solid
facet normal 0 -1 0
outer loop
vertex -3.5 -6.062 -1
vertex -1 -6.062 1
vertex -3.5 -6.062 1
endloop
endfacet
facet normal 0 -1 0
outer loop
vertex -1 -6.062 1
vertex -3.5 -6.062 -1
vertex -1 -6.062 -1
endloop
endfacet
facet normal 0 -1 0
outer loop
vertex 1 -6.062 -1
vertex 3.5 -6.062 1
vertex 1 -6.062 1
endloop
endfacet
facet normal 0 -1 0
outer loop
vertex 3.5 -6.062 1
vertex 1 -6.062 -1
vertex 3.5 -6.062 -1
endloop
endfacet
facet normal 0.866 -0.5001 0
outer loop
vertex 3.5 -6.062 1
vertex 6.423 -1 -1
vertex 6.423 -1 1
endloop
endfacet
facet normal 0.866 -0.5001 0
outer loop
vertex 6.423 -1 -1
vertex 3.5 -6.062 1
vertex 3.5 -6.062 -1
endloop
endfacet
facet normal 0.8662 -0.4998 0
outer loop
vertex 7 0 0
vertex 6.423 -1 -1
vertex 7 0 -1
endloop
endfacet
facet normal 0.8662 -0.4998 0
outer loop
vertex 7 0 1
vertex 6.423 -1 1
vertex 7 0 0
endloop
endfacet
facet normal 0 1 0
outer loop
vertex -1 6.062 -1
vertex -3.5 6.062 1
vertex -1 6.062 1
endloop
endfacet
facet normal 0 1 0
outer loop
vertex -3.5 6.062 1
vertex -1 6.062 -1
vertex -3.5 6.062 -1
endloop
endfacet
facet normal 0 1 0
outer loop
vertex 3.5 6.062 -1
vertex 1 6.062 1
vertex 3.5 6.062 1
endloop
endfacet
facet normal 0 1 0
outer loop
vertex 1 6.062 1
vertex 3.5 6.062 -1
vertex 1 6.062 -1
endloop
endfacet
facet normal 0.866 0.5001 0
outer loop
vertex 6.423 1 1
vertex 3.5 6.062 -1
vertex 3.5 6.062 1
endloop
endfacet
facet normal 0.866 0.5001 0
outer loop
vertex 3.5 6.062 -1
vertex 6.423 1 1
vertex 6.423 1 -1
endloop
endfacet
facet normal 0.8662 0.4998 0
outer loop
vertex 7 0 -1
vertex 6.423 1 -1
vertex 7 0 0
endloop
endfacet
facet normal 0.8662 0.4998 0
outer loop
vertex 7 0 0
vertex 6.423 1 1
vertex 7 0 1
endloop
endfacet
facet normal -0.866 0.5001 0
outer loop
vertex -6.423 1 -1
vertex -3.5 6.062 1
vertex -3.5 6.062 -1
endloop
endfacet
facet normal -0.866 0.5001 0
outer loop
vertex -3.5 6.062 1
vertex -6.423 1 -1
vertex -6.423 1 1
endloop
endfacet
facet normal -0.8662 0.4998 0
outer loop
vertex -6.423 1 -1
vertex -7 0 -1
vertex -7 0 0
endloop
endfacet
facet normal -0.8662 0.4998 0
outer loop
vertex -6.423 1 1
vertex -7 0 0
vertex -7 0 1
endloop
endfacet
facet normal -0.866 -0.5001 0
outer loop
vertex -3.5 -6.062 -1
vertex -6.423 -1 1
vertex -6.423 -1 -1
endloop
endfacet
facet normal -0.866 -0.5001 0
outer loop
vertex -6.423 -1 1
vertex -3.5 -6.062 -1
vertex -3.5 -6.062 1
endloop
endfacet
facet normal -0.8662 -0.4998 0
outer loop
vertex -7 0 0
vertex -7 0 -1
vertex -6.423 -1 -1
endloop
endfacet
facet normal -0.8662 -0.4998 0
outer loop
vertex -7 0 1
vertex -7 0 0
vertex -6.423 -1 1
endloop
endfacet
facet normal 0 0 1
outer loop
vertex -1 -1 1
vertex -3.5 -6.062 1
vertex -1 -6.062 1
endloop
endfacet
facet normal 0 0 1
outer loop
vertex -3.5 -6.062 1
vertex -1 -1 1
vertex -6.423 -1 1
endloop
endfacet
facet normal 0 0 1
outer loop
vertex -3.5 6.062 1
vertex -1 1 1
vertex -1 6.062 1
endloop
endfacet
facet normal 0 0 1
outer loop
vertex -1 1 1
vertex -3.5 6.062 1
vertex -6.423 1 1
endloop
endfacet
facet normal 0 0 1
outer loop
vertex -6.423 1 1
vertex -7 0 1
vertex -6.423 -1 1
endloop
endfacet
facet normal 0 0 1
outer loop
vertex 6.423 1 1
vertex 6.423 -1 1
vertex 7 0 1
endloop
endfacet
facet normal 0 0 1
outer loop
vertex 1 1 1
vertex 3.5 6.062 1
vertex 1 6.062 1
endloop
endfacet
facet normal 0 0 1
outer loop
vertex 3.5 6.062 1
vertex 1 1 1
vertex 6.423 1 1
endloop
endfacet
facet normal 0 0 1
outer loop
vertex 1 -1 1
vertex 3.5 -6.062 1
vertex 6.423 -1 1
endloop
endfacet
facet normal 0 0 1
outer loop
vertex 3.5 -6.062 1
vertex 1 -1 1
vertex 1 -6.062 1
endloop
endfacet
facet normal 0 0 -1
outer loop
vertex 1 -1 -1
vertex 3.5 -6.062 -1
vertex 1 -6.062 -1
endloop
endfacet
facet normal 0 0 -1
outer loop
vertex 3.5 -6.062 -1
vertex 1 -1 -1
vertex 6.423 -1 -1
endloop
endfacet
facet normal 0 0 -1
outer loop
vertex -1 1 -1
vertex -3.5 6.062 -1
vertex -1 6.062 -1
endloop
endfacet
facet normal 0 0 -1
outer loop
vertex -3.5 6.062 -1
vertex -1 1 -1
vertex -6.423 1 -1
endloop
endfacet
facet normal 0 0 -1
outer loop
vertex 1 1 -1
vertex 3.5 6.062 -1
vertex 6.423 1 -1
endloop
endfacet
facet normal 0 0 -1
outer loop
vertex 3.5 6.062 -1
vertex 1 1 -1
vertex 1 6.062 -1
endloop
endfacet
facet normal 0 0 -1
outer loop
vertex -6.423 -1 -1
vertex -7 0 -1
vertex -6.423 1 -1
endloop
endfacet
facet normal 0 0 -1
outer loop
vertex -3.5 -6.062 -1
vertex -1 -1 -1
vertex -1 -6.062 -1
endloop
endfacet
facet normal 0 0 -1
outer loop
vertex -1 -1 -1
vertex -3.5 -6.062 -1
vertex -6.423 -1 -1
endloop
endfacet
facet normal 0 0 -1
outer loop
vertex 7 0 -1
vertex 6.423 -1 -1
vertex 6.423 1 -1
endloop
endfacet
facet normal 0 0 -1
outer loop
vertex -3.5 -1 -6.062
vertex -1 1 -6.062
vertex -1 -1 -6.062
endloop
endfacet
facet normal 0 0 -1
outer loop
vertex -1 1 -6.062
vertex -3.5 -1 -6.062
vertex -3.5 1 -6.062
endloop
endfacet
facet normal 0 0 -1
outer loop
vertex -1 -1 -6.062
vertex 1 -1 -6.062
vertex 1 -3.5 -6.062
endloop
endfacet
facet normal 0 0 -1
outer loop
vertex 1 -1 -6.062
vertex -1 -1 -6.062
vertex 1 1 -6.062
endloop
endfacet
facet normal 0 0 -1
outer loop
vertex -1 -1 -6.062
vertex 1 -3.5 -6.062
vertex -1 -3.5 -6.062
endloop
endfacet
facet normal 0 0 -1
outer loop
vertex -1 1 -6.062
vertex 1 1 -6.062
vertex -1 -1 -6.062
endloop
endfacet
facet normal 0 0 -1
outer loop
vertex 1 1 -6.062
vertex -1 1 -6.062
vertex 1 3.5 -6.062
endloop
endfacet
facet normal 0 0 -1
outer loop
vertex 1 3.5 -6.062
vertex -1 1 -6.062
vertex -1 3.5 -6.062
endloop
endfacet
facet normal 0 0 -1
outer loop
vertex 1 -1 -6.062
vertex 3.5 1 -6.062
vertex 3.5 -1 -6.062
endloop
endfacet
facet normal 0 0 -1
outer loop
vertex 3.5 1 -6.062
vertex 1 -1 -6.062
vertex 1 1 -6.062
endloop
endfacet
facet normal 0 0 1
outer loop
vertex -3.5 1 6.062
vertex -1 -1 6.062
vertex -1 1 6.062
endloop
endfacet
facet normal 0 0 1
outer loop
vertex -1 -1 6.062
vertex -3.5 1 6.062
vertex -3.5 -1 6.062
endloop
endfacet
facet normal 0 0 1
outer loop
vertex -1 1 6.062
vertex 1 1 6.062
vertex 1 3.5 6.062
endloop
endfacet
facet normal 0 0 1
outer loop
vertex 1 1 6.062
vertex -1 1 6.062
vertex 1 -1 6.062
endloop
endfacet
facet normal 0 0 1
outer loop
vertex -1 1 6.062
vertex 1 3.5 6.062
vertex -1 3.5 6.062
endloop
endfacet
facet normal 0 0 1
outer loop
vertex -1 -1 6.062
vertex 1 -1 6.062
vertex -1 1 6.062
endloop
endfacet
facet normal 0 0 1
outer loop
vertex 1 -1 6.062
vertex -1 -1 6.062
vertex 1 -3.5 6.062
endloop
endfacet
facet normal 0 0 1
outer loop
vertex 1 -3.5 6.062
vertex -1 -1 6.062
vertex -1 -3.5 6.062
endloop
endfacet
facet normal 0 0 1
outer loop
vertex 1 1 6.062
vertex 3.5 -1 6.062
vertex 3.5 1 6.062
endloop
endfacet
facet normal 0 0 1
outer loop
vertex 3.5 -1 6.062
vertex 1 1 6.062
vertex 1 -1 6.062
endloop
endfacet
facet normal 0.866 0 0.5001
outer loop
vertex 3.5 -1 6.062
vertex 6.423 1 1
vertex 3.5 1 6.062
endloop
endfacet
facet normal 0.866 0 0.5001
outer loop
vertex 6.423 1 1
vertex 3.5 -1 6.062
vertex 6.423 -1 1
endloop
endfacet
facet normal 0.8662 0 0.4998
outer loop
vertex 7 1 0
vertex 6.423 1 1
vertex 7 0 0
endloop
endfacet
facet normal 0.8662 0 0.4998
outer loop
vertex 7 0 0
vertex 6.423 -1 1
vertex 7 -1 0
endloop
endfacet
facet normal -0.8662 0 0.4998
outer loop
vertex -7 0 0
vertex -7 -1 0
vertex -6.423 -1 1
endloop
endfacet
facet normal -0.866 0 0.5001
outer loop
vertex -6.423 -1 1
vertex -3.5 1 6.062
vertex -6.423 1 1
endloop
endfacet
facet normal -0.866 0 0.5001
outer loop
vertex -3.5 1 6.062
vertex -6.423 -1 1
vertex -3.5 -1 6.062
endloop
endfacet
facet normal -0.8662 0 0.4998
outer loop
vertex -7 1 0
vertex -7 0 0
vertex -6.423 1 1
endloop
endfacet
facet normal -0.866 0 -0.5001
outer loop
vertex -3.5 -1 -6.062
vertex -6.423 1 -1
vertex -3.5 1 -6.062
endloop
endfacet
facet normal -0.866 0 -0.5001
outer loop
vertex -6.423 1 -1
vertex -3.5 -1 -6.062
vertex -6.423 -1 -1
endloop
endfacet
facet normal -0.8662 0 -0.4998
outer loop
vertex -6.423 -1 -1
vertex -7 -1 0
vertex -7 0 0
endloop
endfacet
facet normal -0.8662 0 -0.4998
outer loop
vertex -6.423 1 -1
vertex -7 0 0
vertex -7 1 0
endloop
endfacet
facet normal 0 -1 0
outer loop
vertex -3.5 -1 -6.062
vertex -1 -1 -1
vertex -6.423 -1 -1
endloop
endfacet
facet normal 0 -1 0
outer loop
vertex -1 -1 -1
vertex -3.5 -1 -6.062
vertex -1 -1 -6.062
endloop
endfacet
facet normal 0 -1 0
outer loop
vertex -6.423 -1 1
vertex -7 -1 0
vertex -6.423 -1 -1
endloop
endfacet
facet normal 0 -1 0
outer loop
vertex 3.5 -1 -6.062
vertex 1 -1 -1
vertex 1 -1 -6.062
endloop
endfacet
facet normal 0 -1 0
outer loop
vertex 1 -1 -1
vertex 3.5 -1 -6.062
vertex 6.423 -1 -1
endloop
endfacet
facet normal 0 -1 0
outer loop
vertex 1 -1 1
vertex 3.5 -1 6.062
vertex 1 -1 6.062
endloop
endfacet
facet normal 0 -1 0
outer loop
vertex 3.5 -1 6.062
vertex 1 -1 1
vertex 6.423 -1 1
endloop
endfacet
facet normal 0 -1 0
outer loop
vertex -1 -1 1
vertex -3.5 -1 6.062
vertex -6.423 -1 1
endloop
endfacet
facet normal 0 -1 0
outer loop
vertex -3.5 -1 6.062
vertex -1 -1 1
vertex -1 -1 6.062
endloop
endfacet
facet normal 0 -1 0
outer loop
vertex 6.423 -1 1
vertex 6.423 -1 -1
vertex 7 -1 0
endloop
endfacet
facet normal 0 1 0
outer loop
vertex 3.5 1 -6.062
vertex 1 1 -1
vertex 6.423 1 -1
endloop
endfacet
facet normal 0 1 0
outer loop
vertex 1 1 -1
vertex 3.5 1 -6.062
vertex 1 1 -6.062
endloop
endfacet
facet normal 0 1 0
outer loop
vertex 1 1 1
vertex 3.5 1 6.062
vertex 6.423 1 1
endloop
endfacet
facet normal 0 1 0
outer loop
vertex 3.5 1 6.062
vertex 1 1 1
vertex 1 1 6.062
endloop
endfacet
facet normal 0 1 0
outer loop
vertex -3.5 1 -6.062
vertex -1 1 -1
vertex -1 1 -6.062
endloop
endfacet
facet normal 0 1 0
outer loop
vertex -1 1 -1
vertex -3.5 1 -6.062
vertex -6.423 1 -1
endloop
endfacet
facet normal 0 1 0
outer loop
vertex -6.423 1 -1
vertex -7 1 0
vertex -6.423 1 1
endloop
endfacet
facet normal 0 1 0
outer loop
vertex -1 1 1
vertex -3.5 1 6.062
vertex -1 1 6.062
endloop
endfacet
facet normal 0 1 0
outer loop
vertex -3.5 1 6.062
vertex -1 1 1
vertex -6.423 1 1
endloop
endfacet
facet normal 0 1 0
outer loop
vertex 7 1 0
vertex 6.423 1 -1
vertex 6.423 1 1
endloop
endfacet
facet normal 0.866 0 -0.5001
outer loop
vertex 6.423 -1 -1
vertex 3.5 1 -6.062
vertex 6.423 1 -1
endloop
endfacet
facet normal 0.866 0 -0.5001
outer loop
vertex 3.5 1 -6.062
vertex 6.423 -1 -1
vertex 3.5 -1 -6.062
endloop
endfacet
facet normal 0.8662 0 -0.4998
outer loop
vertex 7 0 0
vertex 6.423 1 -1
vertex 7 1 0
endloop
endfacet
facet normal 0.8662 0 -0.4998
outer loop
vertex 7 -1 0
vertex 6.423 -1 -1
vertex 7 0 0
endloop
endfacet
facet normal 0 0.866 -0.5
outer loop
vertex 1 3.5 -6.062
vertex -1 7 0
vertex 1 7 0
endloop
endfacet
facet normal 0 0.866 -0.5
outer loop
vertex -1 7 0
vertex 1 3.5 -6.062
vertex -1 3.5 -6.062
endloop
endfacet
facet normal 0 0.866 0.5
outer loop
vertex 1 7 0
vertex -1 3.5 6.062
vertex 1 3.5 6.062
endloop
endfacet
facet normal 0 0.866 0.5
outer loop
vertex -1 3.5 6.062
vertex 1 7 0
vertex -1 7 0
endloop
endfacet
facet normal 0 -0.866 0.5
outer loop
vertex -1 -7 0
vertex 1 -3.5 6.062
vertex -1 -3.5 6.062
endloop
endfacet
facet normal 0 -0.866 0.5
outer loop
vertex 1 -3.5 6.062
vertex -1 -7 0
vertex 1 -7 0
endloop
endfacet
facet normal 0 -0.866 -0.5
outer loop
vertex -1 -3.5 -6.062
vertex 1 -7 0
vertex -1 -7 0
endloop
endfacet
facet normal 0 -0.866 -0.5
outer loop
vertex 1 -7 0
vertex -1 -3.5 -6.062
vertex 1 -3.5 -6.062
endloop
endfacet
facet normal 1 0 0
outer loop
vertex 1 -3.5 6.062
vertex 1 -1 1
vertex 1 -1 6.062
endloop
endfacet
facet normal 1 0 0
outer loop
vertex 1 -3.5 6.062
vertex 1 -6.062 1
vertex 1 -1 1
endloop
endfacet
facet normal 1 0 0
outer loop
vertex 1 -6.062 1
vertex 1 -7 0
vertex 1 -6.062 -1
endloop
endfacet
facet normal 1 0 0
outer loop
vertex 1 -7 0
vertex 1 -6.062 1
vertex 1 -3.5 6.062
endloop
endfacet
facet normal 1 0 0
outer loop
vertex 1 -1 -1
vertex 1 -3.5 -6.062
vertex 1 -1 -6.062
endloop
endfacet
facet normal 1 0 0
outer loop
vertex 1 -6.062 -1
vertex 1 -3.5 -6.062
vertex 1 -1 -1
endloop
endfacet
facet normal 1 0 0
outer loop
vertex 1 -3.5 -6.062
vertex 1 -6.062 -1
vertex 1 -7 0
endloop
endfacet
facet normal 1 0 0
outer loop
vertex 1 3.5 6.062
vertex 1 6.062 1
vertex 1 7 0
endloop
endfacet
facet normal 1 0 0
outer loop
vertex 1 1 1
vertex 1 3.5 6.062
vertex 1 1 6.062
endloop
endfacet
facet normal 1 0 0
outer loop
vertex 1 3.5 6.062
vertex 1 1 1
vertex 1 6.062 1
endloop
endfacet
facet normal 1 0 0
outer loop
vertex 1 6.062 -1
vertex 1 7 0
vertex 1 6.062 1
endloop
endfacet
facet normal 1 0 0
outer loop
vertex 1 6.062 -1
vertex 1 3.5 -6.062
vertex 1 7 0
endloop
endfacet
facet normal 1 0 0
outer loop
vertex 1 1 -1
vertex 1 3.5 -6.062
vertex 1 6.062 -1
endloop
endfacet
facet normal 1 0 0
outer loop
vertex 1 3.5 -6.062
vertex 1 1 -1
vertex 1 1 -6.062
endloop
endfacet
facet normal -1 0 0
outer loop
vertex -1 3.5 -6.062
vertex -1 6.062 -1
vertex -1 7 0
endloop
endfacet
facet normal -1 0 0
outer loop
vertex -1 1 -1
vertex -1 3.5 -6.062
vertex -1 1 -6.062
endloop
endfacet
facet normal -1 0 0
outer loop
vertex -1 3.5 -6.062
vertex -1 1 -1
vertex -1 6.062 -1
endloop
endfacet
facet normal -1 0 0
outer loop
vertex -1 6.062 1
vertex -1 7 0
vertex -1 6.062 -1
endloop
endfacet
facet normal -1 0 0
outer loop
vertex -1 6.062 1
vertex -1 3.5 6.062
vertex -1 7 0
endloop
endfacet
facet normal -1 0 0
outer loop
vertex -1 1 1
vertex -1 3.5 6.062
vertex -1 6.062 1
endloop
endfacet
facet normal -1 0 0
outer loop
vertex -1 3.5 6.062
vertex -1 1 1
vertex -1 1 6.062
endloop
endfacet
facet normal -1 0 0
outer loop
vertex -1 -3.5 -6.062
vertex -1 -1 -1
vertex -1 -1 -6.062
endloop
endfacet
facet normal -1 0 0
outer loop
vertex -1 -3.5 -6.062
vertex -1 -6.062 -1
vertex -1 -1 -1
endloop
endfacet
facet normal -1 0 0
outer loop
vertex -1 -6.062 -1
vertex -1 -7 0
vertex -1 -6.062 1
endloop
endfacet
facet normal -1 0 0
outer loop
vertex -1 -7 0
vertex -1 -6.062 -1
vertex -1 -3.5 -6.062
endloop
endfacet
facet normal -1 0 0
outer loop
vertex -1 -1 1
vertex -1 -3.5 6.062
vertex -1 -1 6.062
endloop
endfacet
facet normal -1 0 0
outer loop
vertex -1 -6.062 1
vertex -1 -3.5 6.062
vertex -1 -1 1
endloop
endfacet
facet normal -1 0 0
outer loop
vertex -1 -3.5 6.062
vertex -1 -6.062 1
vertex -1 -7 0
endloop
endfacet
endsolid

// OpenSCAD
$fn=6;

cylinder( r=7, h=2, center=true );
rotate( [90,0,0] ) cylinder( r=7, h=2, center=true ); 
rotate( [90,0,90] ) cylinder( r=7, h=2, center=true ); 
